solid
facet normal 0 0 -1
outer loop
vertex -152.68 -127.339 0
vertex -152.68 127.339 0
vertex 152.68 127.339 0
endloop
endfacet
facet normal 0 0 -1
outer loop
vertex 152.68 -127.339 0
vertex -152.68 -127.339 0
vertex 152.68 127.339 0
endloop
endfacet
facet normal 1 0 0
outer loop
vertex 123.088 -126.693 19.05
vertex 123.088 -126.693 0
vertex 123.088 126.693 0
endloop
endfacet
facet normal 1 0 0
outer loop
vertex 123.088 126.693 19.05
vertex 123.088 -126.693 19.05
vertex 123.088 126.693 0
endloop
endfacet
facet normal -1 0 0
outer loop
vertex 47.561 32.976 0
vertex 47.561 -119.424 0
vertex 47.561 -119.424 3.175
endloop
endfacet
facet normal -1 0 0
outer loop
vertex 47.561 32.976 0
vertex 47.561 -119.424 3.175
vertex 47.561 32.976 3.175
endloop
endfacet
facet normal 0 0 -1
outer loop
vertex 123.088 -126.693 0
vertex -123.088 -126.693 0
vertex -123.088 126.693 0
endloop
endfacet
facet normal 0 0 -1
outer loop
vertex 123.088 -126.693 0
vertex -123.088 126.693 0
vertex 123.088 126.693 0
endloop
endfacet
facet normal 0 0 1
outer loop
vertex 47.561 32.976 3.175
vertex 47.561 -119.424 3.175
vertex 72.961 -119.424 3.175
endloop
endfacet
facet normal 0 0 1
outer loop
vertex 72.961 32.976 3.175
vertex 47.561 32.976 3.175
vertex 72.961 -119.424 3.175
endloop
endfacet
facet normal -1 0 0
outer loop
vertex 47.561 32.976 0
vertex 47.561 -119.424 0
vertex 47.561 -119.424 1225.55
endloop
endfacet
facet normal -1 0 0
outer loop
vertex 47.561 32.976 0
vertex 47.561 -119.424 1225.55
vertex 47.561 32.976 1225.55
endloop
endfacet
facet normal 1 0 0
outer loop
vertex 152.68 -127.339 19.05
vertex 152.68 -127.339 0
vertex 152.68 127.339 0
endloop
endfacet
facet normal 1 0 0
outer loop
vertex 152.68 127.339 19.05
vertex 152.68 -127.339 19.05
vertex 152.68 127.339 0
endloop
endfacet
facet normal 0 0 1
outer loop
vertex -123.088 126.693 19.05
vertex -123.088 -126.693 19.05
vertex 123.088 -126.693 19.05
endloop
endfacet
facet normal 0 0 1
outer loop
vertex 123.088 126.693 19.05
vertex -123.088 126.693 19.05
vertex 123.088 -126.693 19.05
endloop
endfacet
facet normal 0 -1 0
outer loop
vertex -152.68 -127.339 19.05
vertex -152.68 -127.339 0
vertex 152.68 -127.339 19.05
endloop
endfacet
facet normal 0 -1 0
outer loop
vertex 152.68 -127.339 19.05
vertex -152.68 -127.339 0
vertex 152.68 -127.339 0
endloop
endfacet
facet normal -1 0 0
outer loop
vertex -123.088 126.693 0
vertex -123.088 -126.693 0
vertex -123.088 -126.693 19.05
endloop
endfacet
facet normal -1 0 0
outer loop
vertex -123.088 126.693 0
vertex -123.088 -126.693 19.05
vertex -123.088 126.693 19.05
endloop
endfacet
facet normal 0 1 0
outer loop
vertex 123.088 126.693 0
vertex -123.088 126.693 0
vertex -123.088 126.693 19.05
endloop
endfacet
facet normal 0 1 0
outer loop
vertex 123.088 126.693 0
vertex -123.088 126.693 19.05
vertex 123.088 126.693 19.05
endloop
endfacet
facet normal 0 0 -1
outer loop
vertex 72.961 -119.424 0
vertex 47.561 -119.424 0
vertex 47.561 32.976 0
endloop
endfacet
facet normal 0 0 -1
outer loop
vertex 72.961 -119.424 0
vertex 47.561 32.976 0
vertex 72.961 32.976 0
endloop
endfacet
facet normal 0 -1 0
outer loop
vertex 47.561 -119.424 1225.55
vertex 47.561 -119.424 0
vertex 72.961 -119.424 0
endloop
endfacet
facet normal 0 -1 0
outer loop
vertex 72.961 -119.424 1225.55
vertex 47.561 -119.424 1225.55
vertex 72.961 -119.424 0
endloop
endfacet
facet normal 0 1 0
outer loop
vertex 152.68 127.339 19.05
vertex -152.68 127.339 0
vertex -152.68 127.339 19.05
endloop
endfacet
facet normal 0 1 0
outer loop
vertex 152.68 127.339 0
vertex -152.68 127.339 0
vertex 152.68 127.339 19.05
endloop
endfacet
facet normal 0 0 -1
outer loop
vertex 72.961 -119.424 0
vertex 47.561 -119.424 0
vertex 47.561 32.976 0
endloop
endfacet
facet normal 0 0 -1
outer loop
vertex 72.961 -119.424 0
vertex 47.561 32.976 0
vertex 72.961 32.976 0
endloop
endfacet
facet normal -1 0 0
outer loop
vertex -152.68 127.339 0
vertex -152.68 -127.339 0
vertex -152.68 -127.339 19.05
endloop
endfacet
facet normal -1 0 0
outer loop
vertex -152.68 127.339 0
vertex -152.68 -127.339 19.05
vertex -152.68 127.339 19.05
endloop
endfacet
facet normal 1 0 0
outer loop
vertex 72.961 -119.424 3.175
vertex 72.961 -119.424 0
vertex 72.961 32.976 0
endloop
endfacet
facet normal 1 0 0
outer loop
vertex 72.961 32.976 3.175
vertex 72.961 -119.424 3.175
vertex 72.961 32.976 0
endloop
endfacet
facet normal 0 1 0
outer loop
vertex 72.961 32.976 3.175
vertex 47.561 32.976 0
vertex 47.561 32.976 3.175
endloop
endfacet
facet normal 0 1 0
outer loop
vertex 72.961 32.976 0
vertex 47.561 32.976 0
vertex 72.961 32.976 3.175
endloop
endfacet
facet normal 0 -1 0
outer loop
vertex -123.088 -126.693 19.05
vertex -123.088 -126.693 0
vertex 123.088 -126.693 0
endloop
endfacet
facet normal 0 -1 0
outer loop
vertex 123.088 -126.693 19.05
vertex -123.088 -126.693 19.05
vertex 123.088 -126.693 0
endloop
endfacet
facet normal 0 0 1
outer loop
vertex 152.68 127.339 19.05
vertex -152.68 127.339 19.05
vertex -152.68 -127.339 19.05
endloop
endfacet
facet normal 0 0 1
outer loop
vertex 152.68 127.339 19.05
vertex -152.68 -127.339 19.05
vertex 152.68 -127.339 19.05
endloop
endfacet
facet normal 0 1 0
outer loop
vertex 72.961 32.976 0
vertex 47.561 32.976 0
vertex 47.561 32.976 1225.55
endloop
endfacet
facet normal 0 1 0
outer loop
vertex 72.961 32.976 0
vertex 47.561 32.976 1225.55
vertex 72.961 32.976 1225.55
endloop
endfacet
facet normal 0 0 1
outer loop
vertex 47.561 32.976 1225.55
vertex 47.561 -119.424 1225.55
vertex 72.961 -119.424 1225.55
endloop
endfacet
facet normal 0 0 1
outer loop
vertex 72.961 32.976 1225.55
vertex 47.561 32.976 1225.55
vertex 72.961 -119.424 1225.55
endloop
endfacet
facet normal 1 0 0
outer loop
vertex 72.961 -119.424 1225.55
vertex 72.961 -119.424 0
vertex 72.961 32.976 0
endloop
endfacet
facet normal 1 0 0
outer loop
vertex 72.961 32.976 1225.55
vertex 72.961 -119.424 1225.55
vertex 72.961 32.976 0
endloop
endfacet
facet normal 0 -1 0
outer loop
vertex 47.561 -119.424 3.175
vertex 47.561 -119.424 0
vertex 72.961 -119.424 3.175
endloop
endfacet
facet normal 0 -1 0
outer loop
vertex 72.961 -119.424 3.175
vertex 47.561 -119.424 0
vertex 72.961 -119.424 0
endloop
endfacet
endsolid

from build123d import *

# Parameters (mm, degrees)
F0_W     = 305.359244
F0_H     = 254.67813
F1_DEPTH = 19.05
F2_W     = 25.4
F2_H     = 152.4
F3_DEPTH = 3.175
F4_DEPTH = 1225.55
F5_W     = 246.175116
F5_H     = 253.385634
F6_DEPTH = 19.05


with BuildPart() as f1:
    # F0 (on Top) → F1 (new body)
    with BuildSketch(Plane.XY):
        Rectangle(F0_W, F0_H)
    extrude(amount=F1_DEPTH)


with BuildPart() as f3:
    # F2 (on Top) → F3 (new body)
    with BuildSketch(Plane.XY):
        with Locations((60.260743, -43.223813)):
            Rectangle(F2_W, F2_H)
    extrude(amount=F3_DEPTH)


with BuildPart() as f4:
    # F2 (on Top) → F4 (new body)
    with BuildSketch(Plane.XY):
        with Locations((60.260743, -43.223813)):
            Rectangle(F2_W, F2_H)
    extrude(amount=F4_DEPTH)


with BuildPart() as f6:
    # F5 (on Top) → F6 (new body)
    with BuildSketch(Plane.XY):
        Rectangle(F5_W, F5_H)
    extrude(amount=F6_DEPTH)


solid = Compound([f1.part, f3.part, f4.part, f6.part])
